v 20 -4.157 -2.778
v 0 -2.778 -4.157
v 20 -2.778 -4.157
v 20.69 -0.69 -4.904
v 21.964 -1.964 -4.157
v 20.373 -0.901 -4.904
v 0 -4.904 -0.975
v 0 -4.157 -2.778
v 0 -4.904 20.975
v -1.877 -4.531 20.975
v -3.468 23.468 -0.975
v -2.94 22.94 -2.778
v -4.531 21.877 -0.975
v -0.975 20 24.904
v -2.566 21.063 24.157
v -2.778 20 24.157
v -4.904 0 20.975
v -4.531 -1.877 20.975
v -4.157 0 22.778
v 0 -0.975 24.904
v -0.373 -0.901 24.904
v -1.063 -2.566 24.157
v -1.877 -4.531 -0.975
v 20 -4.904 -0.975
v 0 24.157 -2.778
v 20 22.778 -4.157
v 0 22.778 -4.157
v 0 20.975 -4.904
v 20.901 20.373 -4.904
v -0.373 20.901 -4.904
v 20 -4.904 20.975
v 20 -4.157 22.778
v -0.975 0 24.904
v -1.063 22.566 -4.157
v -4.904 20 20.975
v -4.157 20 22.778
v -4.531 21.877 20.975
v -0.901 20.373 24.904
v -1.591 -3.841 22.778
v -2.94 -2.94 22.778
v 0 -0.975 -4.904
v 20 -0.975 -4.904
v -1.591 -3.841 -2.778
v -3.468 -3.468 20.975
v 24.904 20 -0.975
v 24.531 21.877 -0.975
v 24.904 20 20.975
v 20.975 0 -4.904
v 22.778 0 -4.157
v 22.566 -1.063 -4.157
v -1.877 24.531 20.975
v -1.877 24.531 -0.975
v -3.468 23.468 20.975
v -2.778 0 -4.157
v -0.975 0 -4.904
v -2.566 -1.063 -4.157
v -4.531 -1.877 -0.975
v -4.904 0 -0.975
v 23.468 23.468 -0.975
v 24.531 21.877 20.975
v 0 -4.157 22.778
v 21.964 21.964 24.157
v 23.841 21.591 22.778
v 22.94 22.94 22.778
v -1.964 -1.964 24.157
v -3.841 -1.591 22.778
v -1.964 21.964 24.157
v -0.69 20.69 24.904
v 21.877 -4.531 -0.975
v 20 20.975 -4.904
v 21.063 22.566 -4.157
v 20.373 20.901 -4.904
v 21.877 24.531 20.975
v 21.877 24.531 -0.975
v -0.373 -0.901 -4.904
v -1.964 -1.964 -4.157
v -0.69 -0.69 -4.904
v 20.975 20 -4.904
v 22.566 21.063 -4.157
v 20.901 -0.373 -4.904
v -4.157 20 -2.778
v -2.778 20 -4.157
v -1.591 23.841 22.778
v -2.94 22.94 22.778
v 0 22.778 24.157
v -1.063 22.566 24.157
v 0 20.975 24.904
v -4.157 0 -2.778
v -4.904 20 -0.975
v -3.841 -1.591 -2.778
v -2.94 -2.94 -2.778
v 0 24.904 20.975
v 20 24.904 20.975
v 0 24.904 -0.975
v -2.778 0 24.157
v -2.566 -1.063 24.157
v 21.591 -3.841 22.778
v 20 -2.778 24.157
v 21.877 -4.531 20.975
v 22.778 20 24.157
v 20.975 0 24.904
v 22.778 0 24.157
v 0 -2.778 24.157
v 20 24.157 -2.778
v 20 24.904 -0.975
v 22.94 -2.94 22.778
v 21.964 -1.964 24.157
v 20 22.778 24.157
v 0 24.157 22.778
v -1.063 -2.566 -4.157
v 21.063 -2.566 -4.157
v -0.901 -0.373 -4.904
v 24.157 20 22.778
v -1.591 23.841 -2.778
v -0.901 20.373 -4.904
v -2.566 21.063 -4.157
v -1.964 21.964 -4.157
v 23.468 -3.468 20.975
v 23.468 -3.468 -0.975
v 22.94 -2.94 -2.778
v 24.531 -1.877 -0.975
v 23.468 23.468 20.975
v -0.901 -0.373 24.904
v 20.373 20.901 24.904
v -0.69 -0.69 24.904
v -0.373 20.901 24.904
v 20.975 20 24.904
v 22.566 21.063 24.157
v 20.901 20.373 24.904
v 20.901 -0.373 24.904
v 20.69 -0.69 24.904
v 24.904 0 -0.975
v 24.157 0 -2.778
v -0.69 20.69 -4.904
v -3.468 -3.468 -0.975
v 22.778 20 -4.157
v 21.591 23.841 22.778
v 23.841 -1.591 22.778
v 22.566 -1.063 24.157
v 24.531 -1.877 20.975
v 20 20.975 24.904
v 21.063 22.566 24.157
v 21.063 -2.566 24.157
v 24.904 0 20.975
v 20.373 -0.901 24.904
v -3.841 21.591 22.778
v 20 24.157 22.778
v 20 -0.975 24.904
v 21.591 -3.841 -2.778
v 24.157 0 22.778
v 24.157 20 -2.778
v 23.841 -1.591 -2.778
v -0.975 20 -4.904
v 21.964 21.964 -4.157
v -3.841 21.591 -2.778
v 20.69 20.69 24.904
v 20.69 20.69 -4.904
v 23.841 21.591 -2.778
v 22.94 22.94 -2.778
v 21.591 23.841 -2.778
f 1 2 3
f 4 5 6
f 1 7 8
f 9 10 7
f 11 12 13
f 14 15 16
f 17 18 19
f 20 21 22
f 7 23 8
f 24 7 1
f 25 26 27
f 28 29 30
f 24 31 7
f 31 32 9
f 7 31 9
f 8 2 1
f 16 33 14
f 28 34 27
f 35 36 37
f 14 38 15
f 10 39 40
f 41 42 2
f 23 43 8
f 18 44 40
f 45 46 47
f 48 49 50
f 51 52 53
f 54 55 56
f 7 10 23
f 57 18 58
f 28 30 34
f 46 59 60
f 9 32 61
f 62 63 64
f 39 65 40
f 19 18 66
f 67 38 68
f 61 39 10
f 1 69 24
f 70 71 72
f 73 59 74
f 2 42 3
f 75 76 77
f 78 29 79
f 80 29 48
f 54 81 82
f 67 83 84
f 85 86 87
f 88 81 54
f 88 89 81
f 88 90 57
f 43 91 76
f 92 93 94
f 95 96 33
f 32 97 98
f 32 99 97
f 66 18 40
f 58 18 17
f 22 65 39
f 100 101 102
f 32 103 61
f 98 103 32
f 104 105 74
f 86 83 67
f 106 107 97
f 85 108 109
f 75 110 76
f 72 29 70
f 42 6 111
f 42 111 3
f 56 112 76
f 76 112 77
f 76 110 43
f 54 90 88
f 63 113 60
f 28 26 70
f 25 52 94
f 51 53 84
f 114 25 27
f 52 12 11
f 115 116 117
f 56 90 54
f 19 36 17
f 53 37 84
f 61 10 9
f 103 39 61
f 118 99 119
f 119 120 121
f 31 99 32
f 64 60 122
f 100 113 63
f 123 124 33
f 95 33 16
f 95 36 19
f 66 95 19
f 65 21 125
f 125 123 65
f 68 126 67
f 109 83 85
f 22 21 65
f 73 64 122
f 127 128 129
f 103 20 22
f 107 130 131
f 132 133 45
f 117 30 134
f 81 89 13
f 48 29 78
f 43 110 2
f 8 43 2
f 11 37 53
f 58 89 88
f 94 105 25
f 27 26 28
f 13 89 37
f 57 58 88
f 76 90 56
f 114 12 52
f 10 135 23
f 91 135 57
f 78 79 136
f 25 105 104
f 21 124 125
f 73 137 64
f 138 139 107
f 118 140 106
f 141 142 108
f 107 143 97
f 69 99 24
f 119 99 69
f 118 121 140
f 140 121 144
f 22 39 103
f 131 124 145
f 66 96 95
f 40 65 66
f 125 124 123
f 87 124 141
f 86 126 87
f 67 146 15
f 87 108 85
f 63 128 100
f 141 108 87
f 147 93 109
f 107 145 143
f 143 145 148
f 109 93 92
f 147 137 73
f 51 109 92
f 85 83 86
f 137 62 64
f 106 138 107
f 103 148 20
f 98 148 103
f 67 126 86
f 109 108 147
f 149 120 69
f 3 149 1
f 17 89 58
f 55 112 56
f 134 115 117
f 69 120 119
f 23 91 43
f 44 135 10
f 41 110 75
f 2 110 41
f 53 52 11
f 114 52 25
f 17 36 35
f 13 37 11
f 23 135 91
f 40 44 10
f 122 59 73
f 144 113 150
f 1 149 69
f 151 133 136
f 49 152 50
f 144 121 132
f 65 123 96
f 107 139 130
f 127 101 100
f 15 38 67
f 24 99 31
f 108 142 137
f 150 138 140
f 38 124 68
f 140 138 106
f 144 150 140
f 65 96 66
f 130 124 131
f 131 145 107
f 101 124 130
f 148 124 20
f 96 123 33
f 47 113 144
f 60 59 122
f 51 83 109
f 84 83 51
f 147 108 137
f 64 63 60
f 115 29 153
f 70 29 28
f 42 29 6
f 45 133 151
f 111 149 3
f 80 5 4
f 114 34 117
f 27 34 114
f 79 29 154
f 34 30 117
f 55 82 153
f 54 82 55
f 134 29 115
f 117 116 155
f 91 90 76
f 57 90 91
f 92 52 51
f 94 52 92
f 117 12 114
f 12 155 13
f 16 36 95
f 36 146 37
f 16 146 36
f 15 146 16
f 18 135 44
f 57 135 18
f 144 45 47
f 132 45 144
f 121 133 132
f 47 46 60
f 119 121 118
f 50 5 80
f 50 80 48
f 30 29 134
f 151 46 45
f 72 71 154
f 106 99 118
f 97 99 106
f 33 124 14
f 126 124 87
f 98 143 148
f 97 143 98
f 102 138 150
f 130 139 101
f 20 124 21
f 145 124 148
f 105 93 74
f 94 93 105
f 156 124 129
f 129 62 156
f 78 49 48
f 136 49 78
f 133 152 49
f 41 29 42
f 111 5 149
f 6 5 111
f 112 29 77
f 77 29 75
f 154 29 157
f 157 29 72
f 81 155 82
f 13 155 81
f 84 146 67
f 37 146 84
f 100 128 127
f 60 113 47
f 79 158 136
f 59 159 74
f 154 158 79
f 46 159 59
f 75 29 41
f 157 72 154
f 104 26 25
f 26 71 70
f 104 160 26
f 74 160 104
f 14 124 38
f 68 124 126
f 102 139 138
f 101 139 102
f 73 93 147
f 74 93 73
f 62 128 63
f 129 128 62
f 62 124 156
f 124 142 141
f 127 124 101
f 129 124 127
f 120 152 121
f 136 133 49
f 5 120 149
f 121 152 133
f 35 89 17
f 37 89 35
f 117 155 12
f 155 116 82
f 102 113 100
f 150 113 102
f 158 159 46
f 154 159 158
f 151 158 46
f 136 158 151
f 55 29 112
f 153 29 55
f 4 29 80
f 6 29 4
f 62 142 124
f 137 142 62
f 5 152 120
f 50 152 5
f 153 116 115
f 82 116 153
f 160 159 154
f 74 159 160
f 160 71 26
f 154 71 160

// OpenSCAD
fillet = 5;
size = 30;
minkowski() {
  cube([size-2*fillet, size-2*fillet, size-2*fillet]);
  sphere(fillet);
}
